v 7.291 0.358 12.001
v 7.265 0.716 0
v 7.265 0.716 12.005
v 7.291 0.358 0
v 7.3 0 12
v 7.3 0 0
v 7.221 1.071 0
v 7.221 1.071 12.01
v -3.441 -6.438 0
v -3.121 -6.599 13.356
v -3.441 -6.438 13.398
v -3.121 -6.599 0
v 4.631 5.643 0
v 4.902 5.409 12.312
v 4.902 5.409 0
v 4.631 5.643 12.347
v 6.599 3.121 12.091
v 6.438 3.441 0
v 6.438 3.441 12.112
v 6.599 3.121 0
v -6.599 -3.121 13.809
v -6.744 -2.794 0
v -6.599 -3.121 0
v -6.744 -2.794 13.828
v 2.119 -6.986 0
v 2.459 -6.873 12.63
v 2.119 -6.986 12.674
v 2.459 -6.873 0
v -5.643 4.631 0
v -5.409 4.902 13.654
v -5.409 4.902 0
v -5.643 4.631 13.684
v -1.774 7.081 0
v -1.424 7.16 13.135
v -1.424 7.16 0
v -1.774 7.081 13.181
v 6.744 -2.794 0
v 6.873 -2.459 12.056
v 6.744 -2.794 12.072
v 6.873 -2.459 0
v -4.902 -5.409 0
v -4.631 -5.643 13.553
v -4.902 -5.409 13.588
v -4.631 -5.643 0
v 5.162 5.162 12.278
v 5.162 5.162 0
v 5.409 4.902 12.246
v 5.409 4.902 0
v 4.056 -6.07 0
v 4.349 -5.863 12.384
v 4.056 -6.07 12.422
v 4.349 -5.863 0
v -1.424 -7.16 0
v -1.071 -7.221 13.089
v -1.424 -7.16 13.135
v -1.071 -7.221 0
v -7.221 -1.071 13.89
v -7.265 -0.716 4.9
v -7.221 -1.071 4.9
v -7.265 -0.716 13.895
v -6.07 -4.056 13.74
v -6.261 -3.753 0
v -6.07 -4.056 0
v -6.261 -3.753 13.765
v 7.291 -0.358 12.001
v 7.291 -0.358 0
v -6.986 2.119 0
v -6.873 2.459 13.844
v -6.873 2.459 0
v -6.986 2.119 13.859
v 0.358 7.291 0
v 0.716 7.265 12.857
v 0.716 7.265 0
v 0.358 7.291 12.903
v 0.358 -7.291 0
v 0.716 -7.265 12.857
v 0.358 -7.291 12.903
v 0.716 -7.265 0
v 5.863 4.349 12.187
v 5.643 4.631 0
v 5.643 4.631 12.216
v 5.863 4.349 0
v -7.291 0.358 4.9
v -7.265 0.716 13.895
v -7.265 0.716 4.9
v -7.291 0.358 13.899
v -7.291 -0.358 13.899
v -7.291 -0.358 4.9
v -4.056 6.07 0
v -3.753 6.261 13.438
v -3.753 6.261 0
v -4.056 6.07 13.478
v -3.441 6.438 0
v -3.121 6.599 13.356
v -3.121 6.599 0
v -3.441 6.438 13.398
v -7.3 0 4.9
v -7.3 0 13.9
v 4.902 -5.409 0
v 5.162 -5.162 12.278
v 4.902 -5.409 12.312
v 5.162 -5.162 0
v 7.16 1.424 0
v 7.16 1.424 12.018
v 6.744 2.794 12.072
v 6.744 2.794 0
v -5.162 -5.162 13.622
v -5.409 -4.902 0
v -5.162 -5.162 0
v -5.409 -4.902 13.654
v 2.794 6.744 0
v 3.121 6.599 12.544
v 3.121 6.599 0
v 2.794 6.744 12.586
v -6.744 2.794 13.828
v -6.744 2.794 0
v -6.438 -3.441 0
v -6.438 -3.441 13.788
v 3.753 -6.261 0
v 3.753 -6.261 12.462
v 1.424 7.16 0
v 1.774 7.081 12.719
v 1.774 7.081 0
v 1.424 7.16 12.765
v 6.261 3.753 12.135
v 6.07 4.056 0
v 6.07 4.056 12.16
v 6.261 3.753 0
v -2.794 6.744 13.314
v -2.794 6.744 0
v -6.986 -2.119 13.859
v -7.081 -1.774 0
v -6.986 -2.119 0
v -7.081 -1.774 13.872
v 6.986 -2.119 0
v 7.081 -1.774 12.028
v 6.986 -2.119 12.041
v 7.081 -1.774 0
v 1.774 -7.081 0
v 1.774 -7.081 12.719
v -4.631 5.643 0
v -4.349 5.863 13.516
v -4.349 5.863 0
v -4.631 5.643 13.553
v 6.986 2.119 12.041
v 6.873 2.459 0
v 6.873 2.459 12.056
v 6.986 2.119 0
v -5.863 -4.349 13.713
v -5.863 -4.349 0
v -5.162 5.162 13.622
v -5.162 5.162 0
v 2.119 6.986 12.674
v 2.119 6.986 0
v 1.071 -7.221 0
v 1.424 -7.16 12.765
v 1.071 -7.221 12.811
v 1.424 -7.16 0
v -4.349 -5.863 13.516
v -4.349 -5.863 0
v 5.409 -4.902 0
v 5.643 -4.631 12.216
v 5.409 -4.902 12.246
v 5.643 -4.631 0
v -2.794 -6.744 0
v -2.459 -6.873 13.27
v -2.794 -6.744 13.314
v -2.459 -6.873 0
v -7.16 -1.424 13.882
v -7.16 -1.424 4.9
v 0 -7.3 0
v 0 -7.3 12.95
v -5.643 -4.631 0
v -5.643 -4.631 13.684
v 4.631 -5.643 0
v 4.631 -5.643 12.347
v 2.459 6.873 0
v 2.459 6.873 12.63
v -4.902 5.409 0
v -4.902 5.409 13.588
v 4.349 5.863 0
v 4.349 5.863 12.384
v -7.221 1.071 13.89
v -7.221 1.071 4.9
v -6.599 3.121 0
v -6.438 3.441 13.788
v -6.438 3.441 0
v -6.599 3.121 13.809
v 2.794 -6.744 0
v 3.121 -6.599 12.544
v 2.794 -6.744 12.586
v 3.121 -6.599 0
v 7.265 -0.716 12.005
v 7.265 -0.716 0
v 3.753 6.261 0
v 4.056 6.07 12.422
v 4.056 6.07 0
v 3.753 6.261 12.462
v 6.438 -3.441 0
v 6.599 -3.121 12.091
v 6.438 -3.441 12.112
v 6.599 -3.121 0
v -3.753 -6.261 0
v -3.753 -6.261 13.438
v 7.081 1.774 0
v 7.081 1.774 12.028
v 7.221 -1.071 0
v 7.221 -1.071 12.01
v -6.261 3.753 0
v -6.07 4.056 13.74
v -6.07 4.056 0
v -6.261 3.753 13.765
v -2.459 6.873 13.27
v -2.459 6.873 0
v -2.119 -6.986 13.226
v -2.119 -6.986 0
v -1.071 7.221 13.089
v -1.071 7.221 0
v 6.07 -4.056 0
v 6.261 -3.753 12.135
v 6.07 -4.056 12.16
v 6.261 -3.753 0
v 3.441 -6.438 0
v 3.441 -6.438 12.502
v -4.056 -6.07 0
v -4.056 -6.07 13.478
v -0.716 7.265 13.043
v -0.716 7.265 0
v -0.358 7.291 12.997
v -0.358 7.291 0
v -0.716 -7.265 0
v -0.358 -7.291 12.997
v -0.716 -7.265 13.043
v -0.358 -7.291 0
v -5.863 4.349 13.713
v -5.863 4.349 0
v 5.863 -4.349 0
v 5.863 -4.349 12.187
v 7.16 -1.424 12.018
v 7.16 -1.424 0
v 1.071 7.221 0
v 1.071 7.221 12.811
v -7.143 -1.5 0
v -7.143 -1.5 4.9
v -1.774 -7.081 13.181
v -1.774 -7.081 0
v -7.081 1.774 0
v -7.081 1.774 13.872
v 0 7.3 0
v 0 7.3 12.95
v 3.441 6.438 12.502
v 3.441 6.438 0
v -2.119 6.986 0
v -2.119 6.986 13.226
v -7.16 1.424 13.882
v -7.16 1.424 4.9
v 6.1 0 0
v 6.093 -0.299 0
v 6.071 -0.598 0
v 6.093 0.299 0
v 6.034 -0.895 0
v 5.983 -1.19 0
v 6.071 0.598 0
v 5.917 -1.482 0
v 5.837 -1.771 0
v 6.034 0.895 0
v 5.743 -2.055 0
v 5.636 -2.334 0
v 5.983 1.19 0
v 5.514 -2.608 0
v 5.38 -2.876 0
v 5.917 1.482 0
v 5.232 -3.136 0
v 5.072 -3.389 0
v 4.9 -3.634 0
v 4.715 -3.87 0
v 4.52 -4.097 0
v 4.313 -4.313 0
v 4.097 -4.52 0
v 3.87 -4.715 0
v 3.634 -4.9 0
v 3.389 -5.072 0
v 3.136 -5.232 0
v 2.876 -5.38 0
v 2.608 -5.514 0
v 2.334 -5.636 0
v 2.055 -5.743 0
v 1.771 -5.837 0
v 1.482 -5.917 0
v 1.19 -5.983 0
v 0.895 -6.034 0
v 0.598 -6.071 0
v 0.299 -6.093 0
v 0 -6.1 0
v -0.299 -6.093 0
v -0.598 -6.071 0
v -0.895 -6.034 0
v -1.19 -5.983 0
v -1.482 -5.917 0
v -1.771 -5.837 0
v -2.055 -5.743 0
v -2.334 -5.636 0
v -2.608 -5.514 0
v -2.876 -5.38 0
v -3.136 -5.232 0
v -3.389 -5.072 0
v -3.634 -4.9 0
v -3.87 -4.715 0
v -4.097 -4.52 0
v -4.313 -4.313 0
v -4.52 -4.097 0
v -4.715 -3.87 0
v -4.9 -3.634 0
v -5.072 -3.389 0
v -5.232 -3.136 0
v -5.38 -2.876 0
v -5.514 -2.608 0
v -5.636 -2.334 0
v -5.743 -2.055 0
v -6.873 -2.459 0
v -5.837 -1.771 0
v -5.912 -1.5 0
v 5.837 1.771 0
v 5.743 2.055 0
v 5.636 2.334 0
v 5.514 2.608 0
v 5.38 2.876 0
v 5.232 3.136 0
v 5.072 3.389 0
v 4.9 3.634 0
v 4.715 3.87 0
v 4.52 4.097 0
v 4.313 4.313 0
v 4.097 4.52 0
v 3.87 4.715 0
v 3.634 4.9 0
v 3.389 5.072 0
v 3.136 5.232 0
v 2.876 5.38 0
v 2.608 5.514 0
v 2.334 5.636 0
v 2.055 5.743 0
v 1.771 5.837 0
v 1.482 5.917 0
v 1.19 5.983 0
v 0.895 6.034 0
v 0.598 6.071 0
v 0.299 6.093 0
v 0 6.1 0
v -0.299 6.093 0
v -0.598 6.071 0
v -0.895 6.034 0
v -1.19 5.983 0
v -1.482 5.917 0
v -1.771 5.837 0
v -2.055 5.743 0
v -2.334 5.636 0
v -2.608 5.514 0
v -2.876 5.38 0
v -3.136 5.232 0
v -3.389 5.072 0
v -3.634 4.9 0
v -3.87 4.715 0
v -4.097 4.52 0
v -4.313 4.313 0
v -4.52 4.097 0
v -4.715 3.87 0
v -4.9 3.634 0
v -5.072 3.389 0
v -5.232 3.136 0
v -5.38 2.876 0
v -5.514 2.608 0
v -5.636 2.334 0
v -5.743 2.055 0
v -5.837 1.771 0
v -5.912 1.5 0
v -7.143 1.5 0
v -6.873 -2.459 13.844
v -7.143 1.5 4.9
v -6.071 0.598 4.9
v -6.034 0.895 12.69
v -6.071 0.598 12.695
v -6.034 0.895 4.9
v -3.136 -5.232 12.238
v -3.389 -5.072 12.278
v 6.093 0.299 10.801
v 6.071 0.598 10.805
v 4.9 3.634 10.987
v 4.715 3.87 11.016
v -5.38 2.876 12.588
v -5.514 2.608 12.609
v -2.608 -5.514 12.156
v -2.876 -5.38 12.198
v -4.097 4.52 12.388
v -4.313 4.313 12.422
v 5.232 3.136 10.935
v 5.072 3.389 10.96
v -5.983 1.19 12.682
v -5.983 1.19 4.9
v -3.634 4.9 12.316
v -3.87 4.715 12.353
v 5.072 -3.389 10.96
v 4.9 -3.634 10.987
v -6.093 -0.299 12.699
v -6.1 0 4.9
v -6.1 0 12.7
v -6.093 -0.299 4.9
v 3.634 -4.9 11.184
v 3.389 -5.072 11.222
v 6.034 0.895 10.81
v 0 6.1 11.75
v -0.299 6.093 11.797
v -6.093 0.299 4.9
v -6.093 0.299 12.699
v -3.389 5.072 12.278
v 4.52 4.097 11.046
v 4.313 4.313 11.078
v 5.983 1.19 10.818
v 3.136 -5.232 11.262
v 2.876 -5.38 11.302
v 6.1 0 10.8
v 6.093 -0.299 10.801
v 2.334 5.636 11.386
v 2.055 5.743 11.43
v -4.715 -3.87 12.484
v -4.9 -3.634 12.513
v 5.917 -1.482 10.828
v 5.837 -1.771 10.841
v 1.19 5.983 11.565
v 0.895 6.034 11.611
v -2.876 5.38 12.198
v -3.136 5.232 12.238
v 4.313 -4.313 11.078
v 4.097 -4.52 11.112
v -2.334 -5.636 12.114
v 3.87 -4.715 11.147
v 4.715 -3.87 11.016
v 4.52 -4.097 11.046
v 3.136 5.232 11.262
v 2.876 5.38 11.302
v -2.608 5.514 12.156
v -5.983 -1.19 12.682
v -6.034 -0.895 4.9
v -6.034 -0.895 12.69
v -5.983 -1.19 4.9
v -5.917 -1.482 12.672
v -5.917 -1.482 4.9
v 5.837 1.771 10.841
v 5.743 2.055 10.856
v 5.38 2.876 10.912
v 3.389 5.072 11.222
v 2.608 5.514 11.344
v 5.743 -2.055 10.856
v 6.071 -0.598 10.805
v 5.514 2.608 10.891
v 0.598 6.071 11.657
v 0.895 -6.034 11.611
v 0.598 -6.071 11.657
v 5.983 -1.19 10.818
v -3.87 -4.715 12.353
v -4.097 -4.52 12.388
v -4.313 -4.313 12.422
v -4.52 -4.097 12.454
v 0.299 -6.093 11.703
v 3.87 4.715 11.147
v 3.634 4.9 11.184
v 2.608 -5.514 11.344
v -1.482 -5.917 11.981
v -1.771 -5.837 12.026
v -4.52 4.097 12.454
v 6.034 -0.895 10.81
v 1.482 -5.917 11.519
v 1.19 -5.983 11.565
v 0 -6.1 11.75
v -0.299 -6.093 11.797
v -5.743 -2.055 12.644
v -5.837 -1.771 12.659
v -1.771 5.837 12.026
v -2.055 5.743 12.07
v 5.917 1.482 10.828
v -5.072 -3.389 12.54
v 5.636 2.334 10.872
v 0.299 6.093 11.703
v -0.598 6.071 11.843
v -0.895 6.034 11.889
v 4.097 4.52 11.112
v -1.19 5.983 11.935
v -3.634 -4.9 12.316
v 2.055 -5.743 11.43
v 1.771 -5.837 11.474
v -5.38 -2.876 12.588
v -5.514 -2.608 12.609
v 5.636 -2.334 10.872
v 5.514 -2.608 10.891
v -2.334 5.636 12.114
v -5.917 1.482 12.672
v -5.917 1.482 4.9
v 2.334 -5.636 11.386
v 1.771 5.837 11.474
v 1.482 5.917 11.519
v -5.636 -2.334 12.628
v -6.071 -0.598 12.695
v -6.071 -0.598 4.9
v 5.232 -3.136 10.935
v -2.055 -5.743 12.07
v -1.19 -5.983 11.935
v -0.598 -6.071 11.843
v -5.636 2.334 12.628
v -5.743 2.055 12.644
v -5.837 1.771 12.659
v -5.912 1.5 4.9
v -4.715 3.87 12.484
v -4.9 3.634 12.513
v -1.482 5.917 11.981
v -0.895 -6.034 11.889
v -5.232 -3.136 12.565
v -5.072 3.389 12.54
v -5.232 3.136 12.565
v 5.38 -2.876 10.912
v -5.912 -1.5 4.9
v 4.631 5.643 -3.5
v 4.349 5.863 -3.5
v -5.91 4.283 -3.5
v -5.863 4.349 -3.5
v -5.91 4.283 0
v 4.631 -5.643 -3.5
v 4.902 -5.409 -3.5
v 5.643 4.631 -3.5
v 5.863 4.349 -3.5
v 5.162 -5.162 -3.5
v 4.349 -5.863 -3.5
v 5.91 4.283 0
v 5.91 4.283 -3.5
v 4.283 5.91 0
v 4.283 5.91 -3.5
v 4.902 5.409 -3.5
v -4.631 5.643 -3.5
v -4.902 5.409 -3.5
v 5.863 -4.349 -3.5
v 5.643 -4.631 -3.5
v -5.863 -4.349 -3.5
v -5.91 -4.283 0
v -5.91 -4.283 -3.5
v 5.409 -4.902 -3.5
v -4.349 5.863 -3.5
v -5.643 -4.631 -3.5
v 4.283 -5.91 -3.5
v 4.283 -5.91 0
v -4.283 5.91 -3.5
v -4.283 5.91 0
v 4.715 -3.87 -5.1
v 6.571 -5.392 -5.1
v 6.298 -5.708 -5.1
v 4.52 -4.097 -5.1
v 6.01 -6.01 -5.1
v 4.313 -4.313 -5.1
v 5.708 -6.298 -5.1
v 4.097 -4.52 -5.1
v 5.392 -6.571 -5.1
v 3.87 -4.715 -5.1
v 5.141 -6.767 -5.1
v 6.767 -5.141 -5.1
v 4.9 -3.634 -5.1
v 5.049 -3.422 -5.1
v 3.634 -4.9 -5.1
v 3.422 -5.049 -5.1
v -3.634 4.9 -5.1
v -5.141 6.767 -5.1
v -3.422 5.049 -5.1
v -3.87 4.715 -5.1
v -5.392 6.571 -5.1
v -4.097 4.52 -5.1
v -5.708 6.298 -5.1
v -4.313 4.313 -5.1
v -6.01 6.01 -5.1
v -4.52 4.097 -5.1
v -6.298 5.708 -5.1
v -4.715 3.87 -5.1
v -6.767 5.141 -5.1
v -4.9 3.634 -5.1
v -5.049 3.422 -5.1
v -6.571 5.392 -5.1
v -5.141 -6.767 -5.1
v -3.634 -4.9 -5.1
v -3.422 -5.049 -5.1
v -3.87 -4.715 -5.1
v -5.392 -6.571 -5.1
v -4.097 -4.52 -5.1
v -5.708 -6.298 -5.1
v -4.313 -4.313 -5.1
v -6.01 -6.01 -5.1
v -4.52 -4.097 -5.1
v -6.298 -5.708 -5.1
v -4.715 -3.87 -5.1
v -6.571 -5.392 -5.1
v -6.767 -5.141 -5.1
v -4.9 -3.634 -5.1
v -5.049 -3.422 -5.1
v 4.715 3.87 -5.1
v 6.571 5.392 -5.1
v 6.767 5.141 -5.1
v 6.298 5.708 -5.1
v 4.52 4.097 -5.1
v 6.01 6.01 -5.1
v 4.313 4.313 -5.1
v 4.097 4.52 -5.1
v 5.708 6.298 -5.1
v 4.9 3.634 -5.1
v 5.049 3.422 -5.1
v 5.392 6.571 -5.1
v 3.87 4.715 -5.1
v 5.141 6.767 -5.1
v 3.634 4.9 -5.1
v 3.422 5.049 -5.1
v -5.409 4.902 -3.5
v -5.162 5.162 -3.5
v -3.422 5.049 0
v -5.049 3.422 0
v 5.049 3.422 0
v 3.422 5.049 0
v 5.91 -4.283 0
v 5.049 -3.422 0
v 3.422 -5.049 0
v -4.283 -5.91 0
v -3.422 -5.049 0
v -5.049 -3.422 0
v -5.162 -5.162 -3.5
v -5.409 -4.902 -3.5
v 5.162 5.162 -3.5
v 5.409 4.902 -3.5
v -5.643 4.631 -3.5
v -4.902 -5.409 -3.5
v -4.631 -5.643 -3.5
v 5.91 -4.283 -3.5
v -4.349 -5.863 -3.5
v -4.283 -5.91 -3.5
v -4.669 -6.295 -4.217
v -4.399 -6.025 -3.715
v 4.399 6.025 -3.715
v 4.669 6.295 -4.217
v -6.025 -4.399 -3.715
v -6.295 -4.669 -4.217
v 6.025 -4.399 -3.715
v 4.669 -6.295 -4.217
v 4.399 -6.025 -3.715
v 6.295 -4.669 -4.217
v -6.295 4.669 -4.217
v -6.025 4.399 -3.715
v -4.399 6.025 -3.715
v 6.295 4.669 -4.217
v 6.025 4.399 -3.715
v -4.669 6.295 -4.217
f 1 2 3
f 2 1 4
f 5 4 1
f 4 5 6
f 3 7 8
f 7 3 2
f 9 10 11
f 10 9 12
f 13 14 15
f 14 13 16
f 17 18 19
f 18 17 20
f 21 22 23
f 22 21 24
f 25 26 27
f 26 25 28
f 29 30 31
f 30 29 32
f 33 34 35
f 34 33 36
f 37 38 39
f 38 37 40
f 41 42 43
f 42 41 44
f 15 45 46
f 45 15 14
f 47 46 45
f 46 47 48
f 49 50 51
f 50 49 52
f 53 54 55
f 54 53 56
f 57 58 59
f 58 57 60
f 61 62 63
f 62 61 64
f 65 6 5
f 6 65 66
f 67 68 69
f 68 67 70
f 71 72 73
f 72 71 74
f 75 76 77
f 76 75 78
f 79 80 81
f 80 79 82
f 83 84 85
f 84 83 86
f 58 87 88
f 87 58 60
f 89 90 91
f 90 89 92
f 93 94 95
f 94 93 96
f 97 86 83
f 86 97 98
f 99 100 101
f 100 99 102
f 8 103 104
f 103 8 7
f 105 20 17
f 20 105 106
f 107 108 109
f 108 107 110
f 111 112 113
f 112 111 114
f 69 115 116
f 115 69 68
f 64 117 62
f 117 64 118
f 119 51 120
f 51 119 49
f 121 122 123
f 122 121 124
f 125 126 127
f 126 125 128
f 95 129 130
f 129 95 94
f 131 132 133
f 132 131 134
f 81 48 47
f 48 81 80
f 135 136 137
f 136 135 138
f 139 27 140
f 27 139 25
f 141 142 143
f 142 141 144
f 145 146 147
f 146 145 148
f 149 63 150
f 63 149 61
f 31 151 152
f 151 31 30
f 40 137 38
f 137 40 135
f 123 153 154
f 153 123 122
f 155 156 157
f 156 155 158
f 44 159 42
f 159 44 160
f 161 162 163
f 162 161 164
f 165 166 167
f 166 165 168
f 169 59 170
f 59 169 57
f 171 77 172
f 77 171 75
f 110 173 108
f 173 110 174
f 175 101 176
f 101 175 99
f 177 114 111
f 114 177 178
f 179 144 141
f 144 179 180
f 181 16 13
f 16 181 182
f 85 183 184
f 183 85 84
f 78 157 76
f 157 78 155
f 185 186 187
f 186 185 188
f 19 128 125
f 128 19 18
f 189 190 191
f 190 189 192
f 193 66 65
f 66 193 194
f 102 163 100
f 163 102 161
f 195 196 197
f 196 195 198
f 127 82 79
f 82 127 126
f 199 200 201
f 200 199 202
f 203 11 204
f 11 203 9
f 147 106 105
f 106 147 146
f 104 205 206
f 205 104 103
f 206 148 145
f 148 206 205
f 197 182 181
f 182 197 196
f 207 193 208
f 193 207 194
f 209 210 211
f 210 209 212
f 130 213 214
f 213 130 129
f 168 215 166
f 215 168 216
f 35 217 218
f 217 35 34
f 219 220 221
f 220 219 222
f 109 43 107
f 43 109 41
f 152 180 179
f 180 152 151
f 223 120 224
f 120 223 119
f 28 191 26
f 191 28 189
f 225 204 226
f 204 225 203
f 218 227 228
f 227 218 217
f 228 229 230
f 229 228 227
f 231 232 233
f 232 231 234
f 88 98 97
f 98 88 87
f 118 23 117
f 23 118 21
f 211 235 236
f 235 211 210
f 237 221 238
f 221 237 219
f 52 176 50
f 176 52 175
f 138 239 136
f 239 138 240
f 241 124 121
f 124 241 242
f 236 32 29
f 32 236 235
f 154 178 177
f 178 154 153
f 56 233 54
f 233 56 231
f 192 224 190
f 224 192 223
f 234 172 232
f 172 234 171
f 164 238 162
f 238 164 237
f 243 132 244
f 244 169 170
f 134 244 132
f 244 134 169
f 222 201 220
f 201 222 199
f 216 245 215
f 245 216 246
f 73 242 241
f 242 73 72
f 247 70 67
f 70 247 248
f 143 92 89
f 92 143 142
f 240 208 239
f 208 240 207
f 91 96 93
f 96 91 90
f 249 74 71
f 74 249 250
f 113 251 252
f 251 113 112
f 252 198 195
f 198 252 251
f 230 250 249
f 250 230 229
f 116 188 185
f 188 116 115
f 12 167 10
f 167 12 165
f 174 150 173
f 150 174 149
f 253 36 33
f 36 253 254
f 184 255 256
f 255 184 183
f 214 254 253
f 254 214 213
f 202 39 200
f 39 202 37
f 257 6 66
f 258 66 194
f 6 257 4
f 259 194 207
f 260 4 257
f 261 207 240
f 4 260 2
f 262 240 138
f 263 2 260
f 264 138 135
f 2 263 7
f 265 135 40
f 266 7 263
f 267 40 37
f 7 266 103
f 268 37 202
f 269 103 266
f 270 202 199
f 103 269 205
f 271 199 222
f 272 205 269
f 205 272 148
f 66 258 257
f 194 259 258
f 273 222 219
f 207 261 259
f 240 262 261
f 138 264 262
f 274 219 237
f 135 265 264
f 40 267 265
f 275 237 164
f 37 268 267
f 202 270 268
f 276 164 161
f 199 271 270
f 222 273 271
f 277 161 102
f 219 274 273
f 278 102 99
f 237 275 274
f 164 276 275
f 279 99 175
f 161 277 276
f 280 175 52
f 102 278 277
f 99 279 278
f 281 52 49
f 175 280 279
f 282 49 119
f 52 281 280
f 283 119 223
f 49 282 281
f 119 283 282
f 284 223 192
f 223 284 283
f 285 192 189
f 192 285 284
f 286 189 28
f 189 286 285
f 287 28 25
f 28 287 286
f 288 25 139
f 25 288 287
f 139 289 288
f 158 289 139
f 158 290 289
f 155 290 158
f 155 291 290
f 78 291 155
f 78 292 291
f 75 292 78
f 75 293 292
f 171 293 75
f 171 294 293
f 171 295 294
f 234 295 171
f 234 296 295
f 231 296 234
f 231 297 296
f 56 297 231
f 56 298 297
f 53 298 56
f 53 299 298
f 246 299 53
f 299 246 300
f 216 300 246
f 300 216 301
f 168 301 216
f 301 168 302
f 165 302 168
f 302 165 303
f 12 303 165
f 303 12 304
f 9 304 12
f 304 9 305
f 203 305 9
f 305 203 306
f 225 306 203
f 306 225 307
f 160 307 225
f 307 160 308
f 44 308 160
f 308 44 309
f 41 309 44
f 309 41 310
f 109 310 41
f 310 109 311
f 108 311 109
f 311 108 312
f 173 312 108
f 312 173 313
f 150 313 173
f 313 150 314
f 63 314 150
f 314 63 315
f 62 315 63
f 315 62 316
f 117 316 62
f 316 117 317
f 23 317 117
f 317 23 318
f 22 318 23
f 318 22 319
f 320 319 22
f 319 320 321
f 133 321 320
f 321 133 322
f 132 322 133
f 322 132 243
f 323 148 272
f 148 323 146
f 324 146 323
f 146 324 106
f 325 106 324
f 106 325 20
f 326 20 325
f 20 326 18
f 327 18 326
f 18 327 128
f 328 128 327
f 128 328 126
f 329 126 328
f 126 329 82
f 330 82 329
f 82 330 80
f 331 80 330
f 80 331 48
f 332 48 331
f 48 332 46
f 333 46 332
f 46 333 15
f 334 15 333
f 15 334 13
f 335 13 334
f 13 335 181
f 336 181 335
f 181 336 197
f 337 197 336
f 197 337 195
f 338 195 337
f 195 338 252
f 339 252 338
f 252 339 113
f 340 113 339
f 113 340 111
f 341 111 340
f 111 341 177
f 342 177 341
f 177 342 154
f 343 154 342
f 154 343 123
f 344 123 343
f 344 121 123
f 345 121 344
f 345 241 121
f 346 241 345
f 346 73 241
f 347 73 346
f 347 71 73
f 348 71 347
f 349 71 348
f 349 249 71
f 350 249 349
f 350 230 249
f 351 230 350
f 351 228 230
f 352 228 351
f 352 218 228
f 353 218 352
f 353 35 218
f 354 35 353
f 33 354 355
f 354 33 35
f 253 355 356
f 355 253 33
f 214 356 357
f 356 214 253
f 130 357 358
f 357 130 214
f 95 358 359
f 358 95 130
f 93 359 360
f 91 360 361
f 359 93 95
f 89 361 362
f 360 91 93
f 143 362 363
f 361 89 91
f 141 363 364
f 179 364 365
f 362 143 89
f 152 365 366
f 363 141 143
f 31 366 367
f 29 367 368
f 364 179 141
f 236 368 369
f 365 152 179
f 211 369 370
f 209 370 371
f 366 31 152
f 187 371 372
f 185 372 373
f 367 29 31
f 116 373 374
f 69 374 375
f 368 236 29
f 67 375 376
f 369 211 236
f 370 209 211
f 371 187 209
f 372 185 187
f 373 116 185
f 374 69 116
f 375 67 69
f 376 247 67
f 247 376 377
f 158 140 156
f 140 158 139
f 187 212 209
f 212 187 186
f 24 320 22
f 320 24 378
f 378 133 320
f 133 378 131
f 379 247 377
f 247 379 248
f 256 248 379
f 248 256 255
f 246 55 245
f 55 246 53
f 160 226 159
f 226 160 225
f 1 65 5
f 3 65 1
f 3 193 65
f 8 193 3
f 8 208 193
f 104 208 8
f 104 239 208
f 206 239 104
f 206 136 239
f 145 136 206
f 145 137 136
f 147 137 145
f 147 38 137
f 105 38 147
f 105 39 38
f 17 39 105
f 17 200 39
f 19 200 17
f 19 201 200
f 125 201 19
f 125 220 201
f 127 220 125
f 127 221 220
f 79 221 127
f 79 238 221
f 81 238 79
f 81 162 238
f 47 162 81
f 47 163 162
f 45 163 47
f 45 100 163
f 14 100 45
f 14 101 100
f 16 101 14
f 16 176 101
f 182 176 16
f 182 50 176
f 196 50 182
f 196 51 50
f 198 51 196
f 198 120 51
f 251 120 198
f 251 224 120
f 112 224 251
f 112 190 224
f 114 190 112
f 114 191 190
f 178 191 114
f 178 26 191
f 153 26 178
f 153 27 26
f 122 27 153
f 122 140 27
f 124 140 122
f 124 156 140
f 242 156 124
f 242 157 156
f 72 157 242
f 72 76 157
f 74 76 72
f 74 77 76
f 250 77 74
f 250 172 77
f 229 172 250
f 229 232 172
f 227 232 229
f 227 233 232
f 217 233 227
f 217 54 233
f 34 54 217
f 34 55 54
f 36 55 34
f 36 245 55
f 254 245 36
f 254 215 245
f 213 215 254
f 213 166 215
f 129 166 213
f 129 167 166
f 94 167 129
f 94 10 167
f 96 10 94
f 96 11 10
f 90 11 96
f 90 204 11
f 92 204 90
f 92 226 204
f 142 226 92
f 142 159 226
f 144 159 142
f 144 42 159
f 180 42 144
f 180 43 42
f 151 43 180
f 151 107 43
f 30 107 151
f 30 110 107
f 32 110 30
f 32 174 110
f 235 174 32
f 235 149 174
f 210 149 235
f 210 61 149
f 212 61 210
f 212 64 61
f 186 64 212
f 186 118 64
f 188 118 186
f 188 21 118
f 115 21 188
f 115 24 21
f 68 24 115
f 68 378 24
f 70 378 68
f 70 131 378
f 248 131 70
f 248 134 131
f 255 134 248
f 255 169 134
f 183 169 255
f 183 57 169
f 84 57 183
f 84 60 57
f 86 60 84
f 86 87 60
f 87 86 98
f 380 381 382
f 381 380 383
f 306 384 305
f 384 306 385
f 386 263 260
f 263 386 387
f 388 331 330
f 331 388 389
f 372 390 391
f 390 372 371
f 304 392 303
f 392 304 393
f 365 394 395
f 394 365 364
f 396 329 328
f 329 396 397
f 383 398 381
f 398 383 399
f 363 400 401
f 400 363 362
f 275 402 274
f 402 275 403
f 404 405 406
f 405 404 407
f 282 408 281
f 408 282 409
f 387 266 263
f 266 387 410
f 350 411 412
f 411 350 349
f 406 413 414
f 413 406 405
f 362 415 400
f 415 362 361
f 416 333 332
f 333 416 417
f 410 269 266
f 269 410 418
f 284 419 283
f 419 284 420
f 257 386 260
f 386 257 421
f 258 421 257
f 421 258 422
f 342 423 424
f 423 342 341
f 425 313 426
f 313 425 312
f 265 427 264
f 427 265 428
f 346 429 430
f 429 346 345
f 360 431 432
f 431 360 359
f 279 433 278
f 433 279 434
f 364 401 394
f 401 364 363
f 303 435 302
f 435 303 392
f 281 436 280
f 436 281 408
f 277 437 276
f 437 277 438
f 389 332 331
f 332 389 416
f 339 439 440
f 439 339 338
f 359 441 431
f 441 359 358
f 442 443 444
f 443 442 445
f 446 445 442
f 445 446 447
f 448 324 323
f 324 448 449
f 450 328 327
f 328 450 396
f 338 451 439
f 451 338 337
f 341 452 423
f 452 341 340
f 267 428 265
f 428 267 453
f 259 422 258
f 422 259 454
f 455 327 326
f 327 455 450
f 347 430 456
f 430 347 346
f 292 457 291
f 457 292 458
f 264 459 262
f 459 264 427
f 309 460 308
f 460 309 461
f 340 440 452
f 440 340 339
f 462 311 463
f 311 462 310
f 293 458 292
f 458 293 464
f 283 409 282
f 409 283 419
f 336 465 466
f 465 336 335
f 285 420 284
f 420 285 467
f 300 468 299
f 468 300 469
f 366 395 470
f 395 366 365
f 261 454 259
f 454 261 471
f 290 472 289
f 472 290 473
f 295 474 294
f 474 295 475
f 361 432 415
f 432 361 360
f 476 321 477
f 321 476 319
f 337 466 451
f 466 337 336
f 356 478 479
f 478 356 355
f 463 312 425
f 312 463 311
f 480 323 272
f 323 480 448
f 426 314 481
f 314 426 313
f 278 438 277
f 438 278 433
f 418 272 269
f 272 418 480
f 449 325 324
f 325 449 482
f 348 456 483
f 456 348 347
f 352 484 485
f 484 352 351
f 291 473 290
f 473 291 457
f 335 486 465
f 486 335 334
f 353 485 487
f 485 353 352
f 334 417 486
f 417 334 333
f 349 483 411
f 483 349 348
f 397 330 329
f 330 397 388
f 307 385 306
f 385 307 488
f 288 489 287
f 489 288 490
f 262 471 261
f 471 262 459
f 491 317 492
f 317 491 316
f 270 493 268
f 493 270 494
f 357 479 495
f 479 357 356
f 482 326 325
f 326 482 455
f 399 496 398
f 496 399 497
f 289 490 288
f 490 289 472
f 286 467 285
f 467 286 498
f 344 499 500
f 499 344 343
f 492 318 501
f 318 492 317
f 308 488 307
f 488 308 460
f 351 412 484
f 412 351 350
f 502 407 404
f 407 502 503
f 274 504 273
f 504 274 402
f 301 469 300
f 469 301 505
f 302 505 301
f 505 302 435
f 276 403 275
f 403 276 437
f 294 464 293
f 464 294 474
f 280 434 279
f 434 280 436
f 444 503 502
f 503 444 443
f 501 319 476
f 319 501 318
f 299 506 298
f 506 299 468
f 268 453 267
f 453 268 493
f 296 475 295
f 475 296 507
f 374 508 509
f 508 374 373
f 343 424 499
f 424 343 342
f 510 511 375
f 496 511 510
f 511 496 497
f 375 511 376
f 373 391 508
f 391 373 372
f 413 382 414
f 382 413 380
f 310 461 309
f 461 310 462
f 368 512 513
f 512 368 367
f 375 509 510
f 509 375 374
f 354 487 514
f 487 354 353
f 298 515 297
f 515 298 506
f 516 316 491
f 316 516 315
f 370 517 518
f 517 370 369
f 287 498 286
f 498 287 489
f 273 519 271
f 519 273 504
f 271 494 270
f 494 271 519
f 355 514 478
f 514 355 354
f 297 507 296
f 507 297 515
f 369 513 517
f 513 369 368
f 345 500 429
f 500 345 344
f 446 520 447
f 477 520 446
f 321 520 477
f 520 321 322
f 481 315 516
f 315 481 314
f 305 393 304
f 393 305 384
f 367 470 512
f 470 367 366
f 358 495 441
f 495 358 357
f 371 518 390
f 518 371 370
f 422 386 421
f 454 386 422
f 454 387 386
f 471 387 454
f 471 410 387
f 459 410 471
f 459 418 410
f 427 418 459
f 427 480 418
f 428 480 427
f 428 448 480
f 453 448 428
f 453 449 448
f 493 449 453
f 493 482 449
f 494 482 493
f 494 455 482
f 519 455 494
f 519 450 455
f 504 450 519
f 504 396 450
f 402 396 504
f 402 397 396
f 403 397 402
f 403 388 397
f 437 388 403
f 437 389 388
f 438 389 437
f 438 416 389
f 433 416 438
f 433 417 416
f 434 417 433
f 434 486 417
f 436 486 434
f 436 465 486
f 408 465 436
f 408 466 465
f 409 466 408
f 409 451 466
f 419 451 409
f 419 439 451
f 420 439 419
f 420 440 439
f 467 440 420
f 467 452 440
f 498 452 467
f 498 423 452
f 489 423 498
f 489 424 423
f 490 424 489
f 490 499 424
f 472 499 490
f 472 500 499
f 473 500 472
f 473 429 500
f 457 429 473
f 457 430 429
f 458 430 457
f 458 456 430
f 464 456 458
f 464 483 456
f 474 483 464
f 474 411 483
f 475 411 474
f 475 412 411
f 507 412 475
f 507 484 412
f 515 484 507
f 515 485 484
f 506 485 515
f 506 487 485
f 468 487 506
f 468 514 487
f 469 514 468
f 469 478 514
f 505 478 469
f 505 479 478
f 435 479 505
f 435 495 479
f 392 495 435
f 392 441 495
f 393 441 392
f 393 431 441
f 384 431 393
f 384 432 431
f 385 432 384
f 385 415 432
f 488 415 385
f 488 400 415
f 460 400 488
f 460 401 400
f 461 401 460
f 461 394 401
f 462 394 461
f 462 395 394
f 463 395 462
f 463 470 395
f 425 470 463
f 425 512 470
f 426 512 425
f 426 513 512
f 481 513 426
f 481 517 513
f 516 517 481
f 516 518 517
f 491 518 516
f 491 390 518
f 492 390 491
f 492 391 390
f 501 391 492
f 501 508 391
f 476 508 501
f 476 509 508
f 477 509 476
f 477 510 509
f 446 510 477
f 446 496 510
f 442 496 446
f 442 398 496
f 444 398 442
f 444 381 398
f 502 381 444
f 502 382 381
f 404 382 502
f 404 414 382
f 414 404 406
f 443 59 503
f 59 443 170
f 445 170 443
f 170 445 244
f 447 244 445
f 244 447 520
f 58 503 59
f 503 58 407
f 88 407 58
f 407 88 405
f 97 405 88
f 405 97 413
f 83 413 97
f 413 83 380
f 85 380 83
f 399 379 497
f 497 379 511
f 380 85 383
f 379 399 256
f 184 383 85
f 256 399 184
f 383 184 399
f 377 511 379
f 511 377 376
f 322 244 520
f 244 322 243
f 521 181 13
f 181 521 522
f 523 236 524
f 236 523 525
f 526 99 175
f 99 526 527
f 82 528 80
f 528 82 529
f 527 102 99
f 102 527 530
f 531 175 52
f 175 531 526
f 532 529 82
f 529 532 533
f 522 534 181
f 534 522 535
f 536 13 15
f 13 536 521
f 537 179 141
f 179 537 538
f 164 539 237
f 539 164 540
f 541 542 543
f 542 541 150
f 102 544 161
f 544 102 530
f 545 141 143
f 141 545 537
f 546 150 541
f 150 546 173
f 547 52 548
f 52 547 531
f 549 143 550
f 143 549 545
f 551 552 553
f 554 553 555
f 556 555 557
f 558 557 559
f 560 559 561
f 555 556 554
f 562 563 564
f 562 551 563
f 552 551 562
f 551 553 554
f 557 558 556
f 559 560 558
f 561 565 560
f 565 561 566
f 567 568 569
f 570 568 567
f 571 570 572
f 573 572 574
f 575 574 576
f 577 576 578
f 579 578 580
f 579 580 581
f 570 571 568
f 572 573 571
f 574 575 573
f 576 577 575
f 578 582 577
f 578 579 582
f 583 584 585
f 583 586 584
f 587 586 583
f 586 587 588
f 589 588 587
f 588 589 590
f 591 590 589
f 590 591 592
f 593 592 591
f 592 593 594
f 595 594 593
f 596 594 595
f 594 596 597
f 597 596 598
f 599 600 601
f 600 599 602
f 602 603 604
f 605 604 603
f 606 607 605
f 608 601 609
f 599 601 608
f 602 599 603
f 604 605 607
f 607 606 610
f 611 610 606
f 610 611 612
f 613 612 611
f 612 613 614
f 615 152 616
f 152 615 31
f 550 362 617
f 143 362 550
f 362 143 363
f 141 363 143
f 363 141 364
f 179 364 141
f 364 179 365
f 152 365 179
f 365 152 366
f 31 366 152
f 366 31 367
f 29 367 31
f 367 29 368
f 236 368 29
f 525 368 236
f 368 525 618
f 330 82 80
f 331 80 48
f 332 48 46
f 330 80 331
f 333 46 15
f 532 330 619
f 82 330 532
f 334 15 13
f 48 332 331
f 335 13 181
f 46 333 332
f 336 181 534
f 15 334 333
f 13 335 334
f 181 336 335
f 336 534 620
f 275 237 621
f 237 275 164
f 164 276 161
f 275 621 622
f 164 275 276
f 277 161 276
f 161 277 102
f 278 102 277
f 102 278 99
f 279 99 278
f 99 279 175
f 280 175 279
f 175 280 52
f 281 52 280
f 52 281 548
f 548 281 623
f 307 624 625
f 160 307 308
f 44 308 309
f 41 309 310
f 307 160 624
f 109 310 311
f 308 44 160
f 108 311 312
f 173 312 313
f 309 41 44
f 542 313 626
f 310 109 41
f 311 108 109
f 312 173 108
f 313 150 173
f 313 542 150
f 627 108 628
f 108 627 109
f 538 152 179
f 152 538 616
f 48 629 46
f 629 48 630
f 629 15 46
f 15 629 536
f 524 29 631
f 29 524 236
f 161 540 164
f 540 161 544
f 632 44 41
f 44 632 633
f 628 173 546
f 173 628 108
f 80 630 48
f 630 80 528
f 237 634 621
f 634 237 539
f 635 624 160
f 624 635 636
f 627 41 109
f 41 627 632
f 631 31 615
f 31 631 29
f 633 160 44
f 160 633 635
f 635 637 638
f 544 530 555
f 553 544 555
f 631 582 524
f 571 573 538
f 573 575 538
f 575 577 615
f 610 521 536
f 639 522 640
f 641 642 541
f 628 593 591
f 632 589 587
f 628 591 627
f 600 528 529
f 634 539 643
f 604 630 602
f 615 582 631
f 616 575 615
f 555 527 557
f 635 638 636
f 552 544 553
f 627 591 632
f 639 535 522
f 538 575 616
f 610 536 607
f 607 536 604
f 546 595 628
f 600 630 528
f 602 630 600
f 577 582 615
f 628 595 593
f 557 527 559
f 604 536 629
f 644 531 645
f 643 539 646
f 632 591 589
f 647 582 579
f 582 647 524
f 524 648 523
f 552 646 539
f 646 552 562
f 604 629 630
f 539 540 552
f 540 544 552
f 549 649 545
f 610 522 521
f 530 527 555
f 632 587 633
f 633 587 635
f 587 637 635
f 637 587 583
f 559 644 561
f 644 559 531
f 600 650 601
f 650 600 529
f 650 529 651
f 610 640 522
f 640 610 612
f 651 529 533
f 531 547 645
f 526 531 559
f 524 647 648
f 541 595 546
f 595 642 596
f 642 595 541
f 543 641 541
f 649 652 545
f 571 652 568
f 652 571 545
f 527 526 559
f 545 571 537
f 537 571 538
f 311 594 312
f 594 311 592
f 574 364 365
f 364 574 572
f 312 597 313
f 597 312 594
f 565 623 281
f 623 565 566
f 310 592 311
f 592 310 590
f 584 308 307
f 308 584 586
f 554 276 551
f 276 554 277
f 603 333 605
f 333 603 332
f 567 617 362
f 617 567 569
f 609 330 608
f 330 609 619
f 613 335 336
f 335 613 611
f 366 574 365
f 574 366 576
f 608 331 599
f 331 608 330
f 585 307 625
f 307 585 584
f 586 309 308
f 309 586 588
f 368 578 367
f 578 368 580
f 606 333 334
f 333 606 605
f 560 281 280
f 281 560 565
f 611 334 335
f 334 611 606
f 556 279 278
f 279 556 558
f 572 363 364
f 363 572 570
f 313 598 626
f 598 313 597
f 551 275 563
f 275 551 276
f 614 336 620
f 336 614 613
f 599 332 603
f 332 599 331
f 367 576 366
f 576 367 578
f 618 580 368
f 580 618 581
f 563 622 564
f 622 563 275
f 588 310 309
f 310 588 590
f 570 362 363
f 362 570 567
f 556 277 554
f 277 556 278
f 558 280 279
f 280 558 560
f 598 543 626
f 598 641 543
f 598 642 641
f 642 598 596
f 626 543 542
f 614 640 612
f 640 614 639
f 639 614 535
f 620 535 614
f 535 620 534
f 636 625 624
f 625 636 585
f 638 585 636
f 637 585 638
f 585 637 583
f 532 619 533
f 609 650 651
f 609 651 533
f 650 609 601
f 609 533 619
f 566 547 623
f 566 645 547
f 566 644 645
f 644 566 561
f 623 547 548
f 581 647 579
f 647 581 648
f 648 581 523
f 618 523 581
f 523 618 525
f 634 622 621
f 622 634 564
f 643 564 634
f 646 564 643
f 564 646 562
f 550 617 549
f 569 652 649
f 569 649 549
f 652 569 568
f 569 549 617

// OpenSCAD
max_height = 13.9;
min_height = 12;
diameter = 14.6;
cutout_width = 3;
cutout_height = 4.9;
edge_width = 1.2;
feet_width = 2.3;
feet_height = 5.1;

$fn = 128;

module angled_cylinder(max_h, min_h, r) {
    d = r * 2;
    
    b = max_h - min_h;
    c = d;
    a = sqrt((b*b) + (c*c));
    angle_b = acos(((a*a) + (c*c) - (b*b)) / (2 * a * c));
    
    echo(b, angle_b);

    difference() {
        cylinder(max_h, r= r);

        // cut the top off
        color("cyan") translate([-(d / 2), -(d / 2), max_h]) rotate([0, angle_b, 0]) cube([d + min_h, d + min_h, (max_h - min_h)]);
    }
}


radius = diameter / 2;
inner_radius = radius - edge_width;

module plug() {
    inner_max_h = max_height - edge_width;
    inner_min_h = min_height - edge_width;
    
    difference() {
        angled_cylinder(max_height, min_height, radius);
  
        // hollow out the inside
        angled_cylinder(inner_max_h, inner_min_h, r= inner_radius);

        // remove the notch
        color("green") translate([-radius, -(cutout_width / 2), 0]) cube([(edge_width * 2), cutout_width, cutout_height]);
    }
}


module feet() {
    translate([0, 0, -feet_height])
    intersection() {
        difference() {
            union() {
                cylinder(feet_height, r= radius);
                cylinder(edge_width + 0.4, r1= (radius + edge_width), r2 = radius);
            }
            
            cylinder(feet_height, r= inner_radius);
        }
           
        rotate([0, 0, 45]) union() {
            width = diameter + (2 * edge_width);
            
            translate([-(width / 2), -(feet_width/2), 0]) cube([width, feet_width, feet_height]);
            rotate([0, 0, 90]) translate([-(width / 2), -(feet_width/2), 0]) cube([width, feet_width, feet_height]);
        }       
    }
}

difference() {
    union() {
        plug();
        color("orange") feet();
    }
    

/* difference() {
    color("purple") cylinder(max_height, r= radius);
    color("purple") cylinder(max_height, r= inner_radius); 
}*/
}
